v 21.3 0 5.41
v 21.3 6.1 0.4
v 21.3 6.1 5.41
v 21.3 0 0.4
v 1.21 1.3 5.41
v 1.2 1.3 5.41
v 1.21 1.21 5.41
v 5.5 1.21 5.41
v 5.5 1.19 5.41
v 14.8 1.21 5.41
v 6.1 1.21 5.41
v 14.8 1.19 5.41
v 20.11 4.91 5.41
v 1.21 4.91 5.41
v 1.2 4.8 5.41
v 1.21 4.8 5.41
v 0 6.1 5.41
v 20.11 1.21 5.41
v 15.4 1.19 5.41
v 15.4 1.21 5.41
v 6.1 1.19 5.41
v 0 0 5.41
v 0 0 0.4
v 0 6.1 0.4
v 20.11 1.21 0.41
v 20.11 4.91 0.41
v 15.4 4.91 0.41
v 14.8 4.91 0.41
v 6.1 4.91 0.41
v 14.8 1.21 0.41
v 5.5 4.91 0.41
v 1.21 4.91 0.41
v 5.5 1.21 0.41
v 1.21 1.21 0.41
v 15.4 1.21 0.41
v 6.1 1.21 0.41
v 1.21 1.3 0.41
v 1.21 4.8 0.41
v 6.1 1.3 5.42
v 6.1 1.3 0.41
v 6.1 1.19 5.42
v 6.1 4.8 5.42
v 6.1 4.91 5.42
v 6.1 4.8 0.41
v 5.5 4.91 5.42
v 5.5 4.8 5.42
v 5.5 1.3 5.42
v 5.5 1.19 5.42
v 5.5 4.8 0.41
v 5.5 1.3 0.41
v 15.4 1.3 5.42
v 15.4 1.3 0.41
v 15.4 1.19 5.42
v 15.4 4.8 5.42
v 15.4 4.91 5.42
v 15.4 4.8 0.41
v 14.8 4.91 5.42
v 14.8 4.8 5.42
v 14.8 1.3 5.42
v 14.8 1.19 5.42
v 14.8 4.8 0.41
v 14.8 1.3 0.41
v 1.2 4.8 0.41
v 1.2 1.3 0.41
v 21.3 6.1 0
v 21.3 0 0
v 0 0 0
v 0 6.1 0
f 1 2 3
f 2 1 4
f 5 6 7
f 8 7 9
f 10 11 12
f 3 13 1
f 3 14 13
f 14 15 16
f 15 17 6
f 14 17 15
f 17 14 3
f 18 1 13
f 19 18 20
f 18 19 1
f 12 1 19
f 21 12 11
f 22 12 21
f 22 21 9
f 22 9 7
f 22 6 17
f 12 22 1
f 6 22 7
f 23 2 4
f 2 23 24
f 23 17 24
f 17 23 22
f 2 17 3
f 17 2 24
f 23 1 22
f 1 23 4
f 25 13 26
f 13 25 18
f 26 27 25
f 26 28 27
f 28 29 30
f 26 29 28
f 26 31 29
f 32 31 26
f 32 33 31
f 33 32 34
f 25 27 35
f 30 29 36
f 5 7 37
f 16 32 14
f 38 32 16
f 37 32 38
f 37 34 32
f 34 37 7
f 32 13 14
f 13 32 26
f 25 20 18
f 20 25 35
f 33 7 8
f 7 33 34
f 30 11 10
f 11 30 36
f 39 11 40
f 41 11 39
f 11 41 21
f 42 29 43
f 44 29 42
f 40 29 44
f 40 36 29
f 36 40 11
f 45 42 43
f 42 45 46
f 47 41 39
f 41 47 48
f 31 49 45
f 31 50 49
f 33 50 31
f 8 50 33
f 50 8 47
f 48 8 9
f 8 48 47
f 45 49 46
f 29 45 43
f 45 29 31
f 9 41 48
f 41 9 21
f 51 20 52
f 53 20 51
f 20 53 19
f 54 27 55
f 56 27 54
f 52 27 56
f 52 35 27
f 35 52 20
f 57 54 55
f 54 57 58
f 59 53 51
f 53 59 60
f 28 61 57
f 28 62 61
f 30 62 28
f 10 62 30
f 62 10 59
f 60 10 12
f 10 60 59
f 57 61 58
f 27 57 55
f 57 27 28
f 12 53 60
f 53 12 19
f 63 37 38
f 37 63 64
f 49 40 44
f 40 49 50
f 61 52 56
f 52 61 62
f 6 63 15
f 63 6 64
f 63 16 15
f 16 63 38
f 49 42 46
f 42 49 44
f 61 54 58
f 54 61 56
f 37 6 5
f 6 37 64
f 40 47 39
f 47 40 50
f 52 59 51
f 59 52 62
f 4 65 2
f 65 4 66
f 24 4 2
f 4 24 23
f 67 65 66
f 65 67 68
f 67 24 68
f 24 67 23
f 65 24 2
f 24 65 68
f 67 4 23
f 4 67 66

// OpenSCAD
// file: ../../Base/Rotation.scad
// Fischertechnik Box Foundation
// Geometry Helpers Rotation

include <PlacementOptions.scad>

// getRotatedSpace(space, rotation=NoRotation)
// Rotates the space dependent on the specified rotation

function getRotatedSpace(space, rotation=NoRotation) = [
    (rotation == Rotate90 || rotation == Rotate270) ? space.y : space.x,
    (rotation == Rotate90 || rotation == Rotate270) ? space.x : space.y
];

// Rotates the given space around the fixed left lower corner
// space = the space the children needs as width/depth list [width,depth]
// rotation = 0 Rotate0 degrees, 1 Rotate90 degrees, 2 Rotate180 degrees, 3 Rotate270 degrees (equivalent to -90)

module RotateFix(space, rotation=NoRotation) {
    dy = (rotation == Rotate0 || rotation == Rotate270) ? 0 :
        (rotation == Rotate90) ? space.x :
        space.y;
    dx = (rotation < Rotate180) ? 0 :
        (rotation == Rotate180) ? space.x :
        space.y;
    
    translate([dx, dy, 0])
        rotate([0, 0, rotations[rotation]])
            children();
}
// file: ../../Base/Alignment.scad
// Fischertechnik Box Foundation
// Geometry Helpers Alignment

include <PlacementOptions.scad>

// getAlignedX(elementWidth, spaceWidth, align=AlignRight, offset=0)
// Gets the aligned X offset of an element with the given
// width in the given space.
// elementWidth = The width of the element to positon
// spaceWidth = The space where the element should be aligned
// align = 0 AlignLeft, 1 AlignCenter, 2 AlignRight
// offset = an optional offset from the aligned position. When
// aligned left or centered, then positive values are in X direction.
// When aligned right then positive values are in negative X direction.

function getAlignedX(elementWidth, spaceWidth, align=AlignRight, offset=0) =
    (align == AlignLeft) ?
        offset :
        ((align == AlignCenter) ?
        (spaceWidth - elementWidth)/2 + offset :
        spaceWidth - offset - elementWidth);

// getAlignedY(elementDepth, spaceDepth, align=AlignTop, offset=0)
// Gets the aligned Y offset of an element with the given
// depth in the given space.
// elementDepth = The depth of the element to positon
// spaceDepth = The space where the element should be aligned
// align = 0 AlignBottom, 1 AlignCenter, 2 AlignTop
// offset = an optional offset from the aligned position. When
// aligned bottom or centered, then positive values are in Y direction.
// When aligned top then positive values are in negative Y direction.

function getAlignedY(elementDepth, spaceDepth, align=AlignTop, offset=0) =
    (align == AlignBottom) ?
        offset :
        ((align == AlignCenter) ?
        (spaceDepth - elementDepth)/2 + offset :
        spaceDepth - offset - elementDepth);
// file: ../../Base/PlacementOptions.scad
// Fischertechnik Box Foundation
// Placement Options

// Alignment
NoAlign = 0;
AlignLeft = 1;
AlignBottom = 2;
AlignCenter = 3;
AlignRight = 4;
AlignTop = 5;

// Element rotation degree steps
rotations = [0, -90, -180, -270];

// Rotation
NoRotation = 0;
Rotate0 = 0;
Rotate90 = 1;
Rotate180 = 2;
Rotate270 = 3;

// Docking (seen from above)
NoDock = -1;
DockLeft = 0;
DockTop = 1;
DockRight = 2;
DockCorner = 2;
DockBottom = 3;

// Web corners
LowerLeft = 0;
UpperLeft = 1;
UpperRight = 2;
LowerRight = 3;

// Web position relative to corner
LeftOfCorner = 0;
RightOfCorner = 1;
// file: ../../Base/Boxes.scad
// Fischertechnik Box Foundation
// Pre-designed Boxes

use <Constants.scad>

include <PlacementOptions.scad>

box190Width = 190;
box190Depth = 130;
box130Width = 130;
box130Depth = 95;

// Values are from an original ec3 box
topBottomDifference = 1.5;
outerHeight = 40;
innerHeight = 38.2;
baseThickness = outerHeight - innerHeight;
stackExcess = 5.7;
radius = 3.5;
wallThickness = 1.5;
tolerance = 0.2;
stackOffset = innerHeight - stackExcess;

boxUsageHeight = stackOffset;
boxWallThickness = wallThickness;
boxBaseThickness = baseThickness;
boxWebWidth = 3.0;

// getBoxWallThickness()
// Gets the wall thickness of a Fischertechnik Box
function getBoxWallThickness() = boxWallThickness;

// getBoxUsageHeight()
// Gets the usable height of a Fischertechnik box
function getBoxUsageHeight() = boxUsageHeight;

// getBoxInnerHeight()
// Gets the inner height of a Fischertechnik box, including the stack excess
function getBoxInnerHeight() = innerHeight;

// getBoxBaseThickness()
// Gets the thickness of the Fischertechnik box base.
function getBoxBaseThickness() = boxBaseThickness;

// getBoxWebWidth()
// Gets the width of a box web
function getBoxWebWidth() = boxWebWidth;

// getBox190Space()
// Gets the usable inner space of a Box 190 as an x/y-list
function getBox190Space() = [
    box190Width - 2*getBoxWallThickness() - topBottomDifference, 
    box190Depth - 2*getBoxWallThickness() - topBottomDifference ];

// BoxBase(width, depth)
// Creates an empty stackable Fischertechnik compatible box
// width = Outer width of the box (190, 130, ...)
// depth = Outer depth of the box (130, 95, ...)

module BoxBase(width, depth, height=outerHeight) {    
    thinPlate = 0.01;

    innerHeight = height - baseThickness;    
    
    module BodyPlate(width, depth) {
        translate([radius, radius])
        hull() {
            w = width-2*radius;
            d = depth-2*radius;
            cube([w, d, thinPlate]);
            cylinder(thinPlate, r=radius, $fn=getFragments());
            translate([w, 0])
                cylinder(thinPlate, r=radius, $fn=getFragments());
            translate([w, d])
                cylinder(thinPlate, r=radius, $fn=getFragments());
            translate([0, d])
                cylinder(thinPlate, r=radius, $fn=getFragments());
        }
    }
    
    module Body(tolerance=tolerance) {
        hull() {
            // Bottom with tolerance to fit into the original boxes when stacked
            translate([-wallThickness+tolerance, -wallThickness+tolerance, -baseThickness])
                BodyPlate(width-topBottomDifference-2*tolerance, depth-topBottomDifference-2*tolerance);
            
            // Top
            translate([-wallThickness-topBottomDifference/2, -wallThickness-topBottomDifference/2, innerHeight-thinPlate])
                BodyPlate(width, depth);
         }
    }

    module Cutoff() {
        hull() {
            coWidth = width - 2*wallThickness;
            coDepth = depth - 2*wallThickness;
            
            // Bottom
            BodyPlate(coWidth-topBottomDifference, coDepth-topBottomDifference);

            // Top
            translate([-topBottomDifference/2, -topBottomDifference/2, innerHeight+thinPlate]) 
                BodyPlate(coWidth, coDepth);
        }
    }
    
    difference() {        
        Body();
        Cutoff();
        stackOffset = innerHeight - stackExcess;
        translate([0, 0, stackOffset + baseThickness])
            Body(tolerance=0);
    }
}

// Creates the Fischertechnik empty box 130x190 mm and places it at position 0,0
// 190x130 are the outer sizes, the inner space is slightly smaller. Use getBox190Space() to get the inner sizes.
// The box is positioned that the usable inner space is at the 0,0,0 position. The

module Box190() {
    BoxBase(box190Width, box190Depth);
}

// Gets the usable inner space of a Box 130 as an x/y-list
function getBox130Space() = [
    box130Width - 2*getBoxWallThickness() - topBottomDifference, 
    box130Depth - 2*getBoxWallThickness() - topBottomDifference ];

// Creates the Fischertechnik empty box 95x130 mm and places it at position 0,0
// 190x130 are the outer sizes, the inner space is slightly smaller. Use getBox190Space() to get the inner sizes.
// The box is positioned that the usable inner space is at the 0,0,0 position. The

module Box130() {
    BoxBase(box130Width, box130Depth);
}

// Creates a web at the specified box walls
// corner 0 = LowerLeft, 1 = UpperLeft, 2 = UpperRight, 3 = LowerRight
// side 0 = LeftOfCorner, 1 = RightOfCorner
// distance = Distance in mm from the corner
// boxSpace = inner width and depth of the box (default: Box 190)
// webWidth = length of the web (default is 3 mms)
// webThickness = thickness of the web (default is 1 mm)

module BoxWeb(corner, side, distance, boxSpace=getBox190Space(), webWidth=getBoxWebWidth(), webThickness=1.0) {
    sink = getBoxWallThickness()/2;

    width = (corner % 2 == 0) ? 
            (side == LeftOfCorner ? webWidth : webThickness) :
            (side == LeftOfCorner ? webThickness : webWidth);

    depth = (corner % 2 == 0) ? 
            (side == RightOfCorner ? webWidth : webThickness) :
            (side == RightOfCorner ? webThickness : webWidth);
    
    xDiff = corner == LowerLeft ? 
                (side == LeftOfCorner ? -sink : distance) :
            (corner == UpperLeft ?                
                (side == LeftOfCorner ? distance : -sink) :
            (corner == UpperRight ?
                (side == LeftOfCorner ? boxSpace.x-webWidth+sink : boxSpace.x-distance-webThickness) :
                (side == LeftOfCorner ? boxSpace.x-distance-webThickness: boxSpace.x-webWidth+sink)));

    yDiff = corner == LowerLeft ? 
                (side == RightOfCorner ? -sink : distance) :
            (corner == UpperLeft ?
                (side == RightOfCorner ? boxSpace.y-distance : boxSpace.y-webWidth+sink) :
            (corner == UpperRight ?
                (side == RightOfCorner ? boxSpace.y-webWidth+sink : boxSpace.y-distance) :
                (side == RightOfCorner ? distance : -sink)));
    
    translate([xDiff, yDiff, -getExcess()])
        cube([width, depth, boxUsageHeight + 2*getExcess()]);
}
// file: ../../Base/Placement.scad
// Fischertechnik Box Foundation
// Geometry Helpers Placement

use <Constants.scad>
use <Alignment.scad>
use <Rotation.scad>
use <Boxes.scad>

include <PlacementOptions.scad>

// Place(x=0, y=0, elementSpace=[0,0], alignX=AlignLeft, alignY=AlignBottom, rotation=Rotate0, boxSpace=getBox190Space())
// Places the child at the specified position
// y = Y-Position. This is a relative position when an X aligment is specified.
// x = X-Position. This is a relative position when an Y aligment is specified.
// elementSpace = space of the element to be placed [x,y]
// alignX = -1=NoAlign, 0 AlignLeft, 1 AlignCenter, 3 AlignRight (elementSpace and boxSpace required!)
// alignY = -1=NoAlign, 2 AlignBottom, 1 AlignCenter, 4 AlignTop (elementSpace and boxSpace required!)
// rotation = 0 Rotate0 0 degrees, 1 Rotate90 90 degrees, 
// 2 Rotate180 180 degrees, 3 Rotate270 270 degrees (equivalent to -90)
// boxSpace = Inner space of the box where the placement occurs [x,y] - default is Box 190x130 inner space

module Place(x=0, y=0, elementSpace=[0,0], 
  alignX=AlignLeft, alignY=AlignBottom, 
  rotation=NoRotation, boxSpace=getBox190Space()) {

    module Position(x, y, space, rotation=Rotate0) {
        translate([x, y, 0])
            RotateFix(space, rotation)
                children();
    }

    space = getRotatedSpace(elementSpace, rotation);
    alignedX = getAlignedX(space.x, boxSpace.x, alignX, x);
    alignedY = getAlignedY(space.y, boxSpace.y, alignY, y);
    Position(alignedX, alignedY, elementSpace, rotation)
        children();
}

// Center(space=getBox130Space(), elementSpace=[0,0])
// space = Space where the children is centered. For cylinder use centered=true and no elementSpace.
// elementSpace = space of the element to be centered [x,y]

module Center(space=getBox190Space(), elementSpace=[0,0]) {
    Place(elementSpace=elementSpace, boxSpace=space, alignX=AlignCenter, alignY=AlignCenter)
        children();
}

// CenterHorizontal(width=0, y=0, offset=0, space=getBox130Space())
// width = Width of the element to be placed.
// y = Y position of the element
// offset = Offset from the center position (negative will be left of the center)
// space = Space where the element is placed

module CenterHorizontal(width=0, y=0, offset=0, space=getBox190Space()) {
    Place(x=offset, y=y, elementSpace=[width, 0], boxSpace=space, alignX=AlignCenter)
        children(0);
}

// CenterVertical(depth=0, x=0, offset=0, space=getBox130Space())
// depth = Depth of the element to be placed.
// x = X position of the element
// offset = Offset from the center position (negative will be down of the center)
// space = Space where the element is placed

module CenterVertical(depth=0, x=0, offset=0, space=getBox190Space()) {
    Place(x=x, y=offset, elementSpace=[0, depth], boxSpace=space, alignY=AlignCenter)
        children(0);
}

// getIsVertical(align)
// True if the specified alignment needs a vertical orientation for a divider (AlignRight, AlignLeft)

function getIsVertical(align) = (align == AlignRight || align == AlignLeft);

// getIsHorizontal(align)
// True if the specified alignment needs a horizontal orientation for a divider (AlignTop, AlignBottom)

function getIsHorizontal(align) = (align == AlignTop || align == AlignBottom);
// file: ../../Elements/AxisClip10.scad
// Fischertechnik Box Library
// Axis for clip 10
// 31023

use <../ModelBase/Simple.scad>
use <../Base/Constants.scad>

width = 12;
depth = 12;
height = 23;
upperDiameter = 3.6;
clipHeight = 10;

// getAxisClip10Space()
// Gets the space of a frame for a clip 10 with spring ring (mot2)

function getAxisClip10Space() = [width, depth, height];

// AxisClip10(height, clipHeight)
// Axis for clip 10 with spring ring (mot2)
// height = Height of the complete axis
// clipHeight = Height of the rt for the clip (standard is 10, in mot3 its only 7)

module AxisClip10(height=height, clipHeight=clipHeight) {
    LeveledAxisWithSpace(height, height-clipHeight, getAxisClip10Space(), diameter=upperDiameter);
}

// Tests
color("lightgray")
AxisClip10();
// file: ../../Base/Constants.scad
// Fischertechnik Box Foundation
// Constants

// Constant values necessary for multiple elements

// Base constants
dividerThickness = 1.2;
excess = 0.01;
fragments = 90;
tolerance = 0.8;

// Gets the thickness of a divider 
function getDividerThickness() = dividerThickness;

// Gets the excess that is used to merge walls into each other
function getExcess() = excess;

// Gets amount of fragments of a cylinder
function getFragments() = fragments;

// Gets the inner tolerance of a frame to each side
function getTolerance() = tolerance;


// Fischertechnik specific constants
axisDiameter = 4;
axisBottomDiameter = axisDiameter + 1;
standardEdgeDistance = 2.5;
standardWebDistance = 11.5;
standardCornerLength = 15;
tubeWallFactor = 0.8;
smallPartsFrameHeight = 20;

// Gets axis diameter
function getAxisDiameter() = axisDiameter;

// Gets axis bottom diameter for thicker part at the bottom
function getAxisBottomDiameter() = axisBottomDiameter;

// gets the standard distance to the wall of the box for dockable frames with webs
function getStandardEdgeDistance() = standardEdgeDistance;

// gets the standard distance of each web to the corner of the dockable frame
function getStandardWebDistance() = standardWebDistance;

// gets the standard length of the corner walls of a dockable frame
function getStandardCornerLength() = standardCornerLength;

// gets the wall thickness of a tube.
function getTubeWallThickness() = tubeWallFactor * getDividerThickness();

// gets the frame height for docked small parts boxes.
function getSmallPartsFrameHeight() = smallPartsFrameHeight;
// file: ../../Elements/FrameElectronicBlockConnector.scad
// Fischertechnik Box Library
// Frame for Electronic Block Connector
// 36380

use <../Base/Constants.scad>
use <../ModelBase/Simple.scad>

width = 18.5;
depth = 3.3;
height = 5;
tolerance = 0.4;

// getFrameElectronicBlockConnectorSpace()
// Gets the space the frame for electronic block conector needs as width and depth (.x and .y as a list)

function getFrameElectronicBlockConnectorSpace() = 
    getFrameOuterVolume([width, depth, height], tolerance = tolerance);

// FrameElectronicBlockConnector()
// Frame for electronic block connector

module FrameElectronicBlockConnector() {    
    webThickness = 0.6;
    webDepth = 0.1;
    webDistance = 4.3;
    innerVolume = getFrameInnerVolume([width, depth, height], tolerance = tolerance);
    
    module InnerFrame() {
        Frame([width, depth, height], tolerance = tolerance);
        
        translate([0, getDividerThickness()-getExcess(), -getExcess()]) {
            translate([getDividerThickness()+webDistance, 0])
                cube([webThickness, innerVolume.y+2*getExcess(), innerVolume.z+getExcess()]);
            translate([getDividerThickness()+width-webDistance-webThickness, 0])
                cube([webThickness, innerVolume.y+2*getExcess(), innerVolume.z+getExcess()]);
        }
    }

    difference() {
        InnerFrame();

        cutoffWidth = innerVolume.x;
        cutoffDepth = innerVolume.y - 2*webDepth;
        
        translate([getDividerThickness(), getDividerThickness() + webDepth, 0])
            cube([cutoffWidth, cutoffDepth, height+1]);
    }
}

// Test
color("lightgray") {
    FrameElectronicBlockConnector();
}
// file: ../TestPrint.scad
// 3D Print Test Base

use <../Base/Constants.scad>

use <../Elements/AxisClip10.scad>

module TestPrint(elementSpace) {
    cube([elementSpace.x, elementSpace.y, 0.4]);
    translate([0,0,0.4+getExcess()]) {
        children();
    }
}

TestPrint(getAxisClip10Space())
    AxisClip10();
// main file
// 3D Print Test
// FrameElectronicBlockConnector

use <../TestPrint.scad>
use <../../Elements/FrameElectronicBlockConnector.scad>

TestPrint(getFrameElectronicBlockConnectorSpace())
    FrameElectronicBlockConnector();
